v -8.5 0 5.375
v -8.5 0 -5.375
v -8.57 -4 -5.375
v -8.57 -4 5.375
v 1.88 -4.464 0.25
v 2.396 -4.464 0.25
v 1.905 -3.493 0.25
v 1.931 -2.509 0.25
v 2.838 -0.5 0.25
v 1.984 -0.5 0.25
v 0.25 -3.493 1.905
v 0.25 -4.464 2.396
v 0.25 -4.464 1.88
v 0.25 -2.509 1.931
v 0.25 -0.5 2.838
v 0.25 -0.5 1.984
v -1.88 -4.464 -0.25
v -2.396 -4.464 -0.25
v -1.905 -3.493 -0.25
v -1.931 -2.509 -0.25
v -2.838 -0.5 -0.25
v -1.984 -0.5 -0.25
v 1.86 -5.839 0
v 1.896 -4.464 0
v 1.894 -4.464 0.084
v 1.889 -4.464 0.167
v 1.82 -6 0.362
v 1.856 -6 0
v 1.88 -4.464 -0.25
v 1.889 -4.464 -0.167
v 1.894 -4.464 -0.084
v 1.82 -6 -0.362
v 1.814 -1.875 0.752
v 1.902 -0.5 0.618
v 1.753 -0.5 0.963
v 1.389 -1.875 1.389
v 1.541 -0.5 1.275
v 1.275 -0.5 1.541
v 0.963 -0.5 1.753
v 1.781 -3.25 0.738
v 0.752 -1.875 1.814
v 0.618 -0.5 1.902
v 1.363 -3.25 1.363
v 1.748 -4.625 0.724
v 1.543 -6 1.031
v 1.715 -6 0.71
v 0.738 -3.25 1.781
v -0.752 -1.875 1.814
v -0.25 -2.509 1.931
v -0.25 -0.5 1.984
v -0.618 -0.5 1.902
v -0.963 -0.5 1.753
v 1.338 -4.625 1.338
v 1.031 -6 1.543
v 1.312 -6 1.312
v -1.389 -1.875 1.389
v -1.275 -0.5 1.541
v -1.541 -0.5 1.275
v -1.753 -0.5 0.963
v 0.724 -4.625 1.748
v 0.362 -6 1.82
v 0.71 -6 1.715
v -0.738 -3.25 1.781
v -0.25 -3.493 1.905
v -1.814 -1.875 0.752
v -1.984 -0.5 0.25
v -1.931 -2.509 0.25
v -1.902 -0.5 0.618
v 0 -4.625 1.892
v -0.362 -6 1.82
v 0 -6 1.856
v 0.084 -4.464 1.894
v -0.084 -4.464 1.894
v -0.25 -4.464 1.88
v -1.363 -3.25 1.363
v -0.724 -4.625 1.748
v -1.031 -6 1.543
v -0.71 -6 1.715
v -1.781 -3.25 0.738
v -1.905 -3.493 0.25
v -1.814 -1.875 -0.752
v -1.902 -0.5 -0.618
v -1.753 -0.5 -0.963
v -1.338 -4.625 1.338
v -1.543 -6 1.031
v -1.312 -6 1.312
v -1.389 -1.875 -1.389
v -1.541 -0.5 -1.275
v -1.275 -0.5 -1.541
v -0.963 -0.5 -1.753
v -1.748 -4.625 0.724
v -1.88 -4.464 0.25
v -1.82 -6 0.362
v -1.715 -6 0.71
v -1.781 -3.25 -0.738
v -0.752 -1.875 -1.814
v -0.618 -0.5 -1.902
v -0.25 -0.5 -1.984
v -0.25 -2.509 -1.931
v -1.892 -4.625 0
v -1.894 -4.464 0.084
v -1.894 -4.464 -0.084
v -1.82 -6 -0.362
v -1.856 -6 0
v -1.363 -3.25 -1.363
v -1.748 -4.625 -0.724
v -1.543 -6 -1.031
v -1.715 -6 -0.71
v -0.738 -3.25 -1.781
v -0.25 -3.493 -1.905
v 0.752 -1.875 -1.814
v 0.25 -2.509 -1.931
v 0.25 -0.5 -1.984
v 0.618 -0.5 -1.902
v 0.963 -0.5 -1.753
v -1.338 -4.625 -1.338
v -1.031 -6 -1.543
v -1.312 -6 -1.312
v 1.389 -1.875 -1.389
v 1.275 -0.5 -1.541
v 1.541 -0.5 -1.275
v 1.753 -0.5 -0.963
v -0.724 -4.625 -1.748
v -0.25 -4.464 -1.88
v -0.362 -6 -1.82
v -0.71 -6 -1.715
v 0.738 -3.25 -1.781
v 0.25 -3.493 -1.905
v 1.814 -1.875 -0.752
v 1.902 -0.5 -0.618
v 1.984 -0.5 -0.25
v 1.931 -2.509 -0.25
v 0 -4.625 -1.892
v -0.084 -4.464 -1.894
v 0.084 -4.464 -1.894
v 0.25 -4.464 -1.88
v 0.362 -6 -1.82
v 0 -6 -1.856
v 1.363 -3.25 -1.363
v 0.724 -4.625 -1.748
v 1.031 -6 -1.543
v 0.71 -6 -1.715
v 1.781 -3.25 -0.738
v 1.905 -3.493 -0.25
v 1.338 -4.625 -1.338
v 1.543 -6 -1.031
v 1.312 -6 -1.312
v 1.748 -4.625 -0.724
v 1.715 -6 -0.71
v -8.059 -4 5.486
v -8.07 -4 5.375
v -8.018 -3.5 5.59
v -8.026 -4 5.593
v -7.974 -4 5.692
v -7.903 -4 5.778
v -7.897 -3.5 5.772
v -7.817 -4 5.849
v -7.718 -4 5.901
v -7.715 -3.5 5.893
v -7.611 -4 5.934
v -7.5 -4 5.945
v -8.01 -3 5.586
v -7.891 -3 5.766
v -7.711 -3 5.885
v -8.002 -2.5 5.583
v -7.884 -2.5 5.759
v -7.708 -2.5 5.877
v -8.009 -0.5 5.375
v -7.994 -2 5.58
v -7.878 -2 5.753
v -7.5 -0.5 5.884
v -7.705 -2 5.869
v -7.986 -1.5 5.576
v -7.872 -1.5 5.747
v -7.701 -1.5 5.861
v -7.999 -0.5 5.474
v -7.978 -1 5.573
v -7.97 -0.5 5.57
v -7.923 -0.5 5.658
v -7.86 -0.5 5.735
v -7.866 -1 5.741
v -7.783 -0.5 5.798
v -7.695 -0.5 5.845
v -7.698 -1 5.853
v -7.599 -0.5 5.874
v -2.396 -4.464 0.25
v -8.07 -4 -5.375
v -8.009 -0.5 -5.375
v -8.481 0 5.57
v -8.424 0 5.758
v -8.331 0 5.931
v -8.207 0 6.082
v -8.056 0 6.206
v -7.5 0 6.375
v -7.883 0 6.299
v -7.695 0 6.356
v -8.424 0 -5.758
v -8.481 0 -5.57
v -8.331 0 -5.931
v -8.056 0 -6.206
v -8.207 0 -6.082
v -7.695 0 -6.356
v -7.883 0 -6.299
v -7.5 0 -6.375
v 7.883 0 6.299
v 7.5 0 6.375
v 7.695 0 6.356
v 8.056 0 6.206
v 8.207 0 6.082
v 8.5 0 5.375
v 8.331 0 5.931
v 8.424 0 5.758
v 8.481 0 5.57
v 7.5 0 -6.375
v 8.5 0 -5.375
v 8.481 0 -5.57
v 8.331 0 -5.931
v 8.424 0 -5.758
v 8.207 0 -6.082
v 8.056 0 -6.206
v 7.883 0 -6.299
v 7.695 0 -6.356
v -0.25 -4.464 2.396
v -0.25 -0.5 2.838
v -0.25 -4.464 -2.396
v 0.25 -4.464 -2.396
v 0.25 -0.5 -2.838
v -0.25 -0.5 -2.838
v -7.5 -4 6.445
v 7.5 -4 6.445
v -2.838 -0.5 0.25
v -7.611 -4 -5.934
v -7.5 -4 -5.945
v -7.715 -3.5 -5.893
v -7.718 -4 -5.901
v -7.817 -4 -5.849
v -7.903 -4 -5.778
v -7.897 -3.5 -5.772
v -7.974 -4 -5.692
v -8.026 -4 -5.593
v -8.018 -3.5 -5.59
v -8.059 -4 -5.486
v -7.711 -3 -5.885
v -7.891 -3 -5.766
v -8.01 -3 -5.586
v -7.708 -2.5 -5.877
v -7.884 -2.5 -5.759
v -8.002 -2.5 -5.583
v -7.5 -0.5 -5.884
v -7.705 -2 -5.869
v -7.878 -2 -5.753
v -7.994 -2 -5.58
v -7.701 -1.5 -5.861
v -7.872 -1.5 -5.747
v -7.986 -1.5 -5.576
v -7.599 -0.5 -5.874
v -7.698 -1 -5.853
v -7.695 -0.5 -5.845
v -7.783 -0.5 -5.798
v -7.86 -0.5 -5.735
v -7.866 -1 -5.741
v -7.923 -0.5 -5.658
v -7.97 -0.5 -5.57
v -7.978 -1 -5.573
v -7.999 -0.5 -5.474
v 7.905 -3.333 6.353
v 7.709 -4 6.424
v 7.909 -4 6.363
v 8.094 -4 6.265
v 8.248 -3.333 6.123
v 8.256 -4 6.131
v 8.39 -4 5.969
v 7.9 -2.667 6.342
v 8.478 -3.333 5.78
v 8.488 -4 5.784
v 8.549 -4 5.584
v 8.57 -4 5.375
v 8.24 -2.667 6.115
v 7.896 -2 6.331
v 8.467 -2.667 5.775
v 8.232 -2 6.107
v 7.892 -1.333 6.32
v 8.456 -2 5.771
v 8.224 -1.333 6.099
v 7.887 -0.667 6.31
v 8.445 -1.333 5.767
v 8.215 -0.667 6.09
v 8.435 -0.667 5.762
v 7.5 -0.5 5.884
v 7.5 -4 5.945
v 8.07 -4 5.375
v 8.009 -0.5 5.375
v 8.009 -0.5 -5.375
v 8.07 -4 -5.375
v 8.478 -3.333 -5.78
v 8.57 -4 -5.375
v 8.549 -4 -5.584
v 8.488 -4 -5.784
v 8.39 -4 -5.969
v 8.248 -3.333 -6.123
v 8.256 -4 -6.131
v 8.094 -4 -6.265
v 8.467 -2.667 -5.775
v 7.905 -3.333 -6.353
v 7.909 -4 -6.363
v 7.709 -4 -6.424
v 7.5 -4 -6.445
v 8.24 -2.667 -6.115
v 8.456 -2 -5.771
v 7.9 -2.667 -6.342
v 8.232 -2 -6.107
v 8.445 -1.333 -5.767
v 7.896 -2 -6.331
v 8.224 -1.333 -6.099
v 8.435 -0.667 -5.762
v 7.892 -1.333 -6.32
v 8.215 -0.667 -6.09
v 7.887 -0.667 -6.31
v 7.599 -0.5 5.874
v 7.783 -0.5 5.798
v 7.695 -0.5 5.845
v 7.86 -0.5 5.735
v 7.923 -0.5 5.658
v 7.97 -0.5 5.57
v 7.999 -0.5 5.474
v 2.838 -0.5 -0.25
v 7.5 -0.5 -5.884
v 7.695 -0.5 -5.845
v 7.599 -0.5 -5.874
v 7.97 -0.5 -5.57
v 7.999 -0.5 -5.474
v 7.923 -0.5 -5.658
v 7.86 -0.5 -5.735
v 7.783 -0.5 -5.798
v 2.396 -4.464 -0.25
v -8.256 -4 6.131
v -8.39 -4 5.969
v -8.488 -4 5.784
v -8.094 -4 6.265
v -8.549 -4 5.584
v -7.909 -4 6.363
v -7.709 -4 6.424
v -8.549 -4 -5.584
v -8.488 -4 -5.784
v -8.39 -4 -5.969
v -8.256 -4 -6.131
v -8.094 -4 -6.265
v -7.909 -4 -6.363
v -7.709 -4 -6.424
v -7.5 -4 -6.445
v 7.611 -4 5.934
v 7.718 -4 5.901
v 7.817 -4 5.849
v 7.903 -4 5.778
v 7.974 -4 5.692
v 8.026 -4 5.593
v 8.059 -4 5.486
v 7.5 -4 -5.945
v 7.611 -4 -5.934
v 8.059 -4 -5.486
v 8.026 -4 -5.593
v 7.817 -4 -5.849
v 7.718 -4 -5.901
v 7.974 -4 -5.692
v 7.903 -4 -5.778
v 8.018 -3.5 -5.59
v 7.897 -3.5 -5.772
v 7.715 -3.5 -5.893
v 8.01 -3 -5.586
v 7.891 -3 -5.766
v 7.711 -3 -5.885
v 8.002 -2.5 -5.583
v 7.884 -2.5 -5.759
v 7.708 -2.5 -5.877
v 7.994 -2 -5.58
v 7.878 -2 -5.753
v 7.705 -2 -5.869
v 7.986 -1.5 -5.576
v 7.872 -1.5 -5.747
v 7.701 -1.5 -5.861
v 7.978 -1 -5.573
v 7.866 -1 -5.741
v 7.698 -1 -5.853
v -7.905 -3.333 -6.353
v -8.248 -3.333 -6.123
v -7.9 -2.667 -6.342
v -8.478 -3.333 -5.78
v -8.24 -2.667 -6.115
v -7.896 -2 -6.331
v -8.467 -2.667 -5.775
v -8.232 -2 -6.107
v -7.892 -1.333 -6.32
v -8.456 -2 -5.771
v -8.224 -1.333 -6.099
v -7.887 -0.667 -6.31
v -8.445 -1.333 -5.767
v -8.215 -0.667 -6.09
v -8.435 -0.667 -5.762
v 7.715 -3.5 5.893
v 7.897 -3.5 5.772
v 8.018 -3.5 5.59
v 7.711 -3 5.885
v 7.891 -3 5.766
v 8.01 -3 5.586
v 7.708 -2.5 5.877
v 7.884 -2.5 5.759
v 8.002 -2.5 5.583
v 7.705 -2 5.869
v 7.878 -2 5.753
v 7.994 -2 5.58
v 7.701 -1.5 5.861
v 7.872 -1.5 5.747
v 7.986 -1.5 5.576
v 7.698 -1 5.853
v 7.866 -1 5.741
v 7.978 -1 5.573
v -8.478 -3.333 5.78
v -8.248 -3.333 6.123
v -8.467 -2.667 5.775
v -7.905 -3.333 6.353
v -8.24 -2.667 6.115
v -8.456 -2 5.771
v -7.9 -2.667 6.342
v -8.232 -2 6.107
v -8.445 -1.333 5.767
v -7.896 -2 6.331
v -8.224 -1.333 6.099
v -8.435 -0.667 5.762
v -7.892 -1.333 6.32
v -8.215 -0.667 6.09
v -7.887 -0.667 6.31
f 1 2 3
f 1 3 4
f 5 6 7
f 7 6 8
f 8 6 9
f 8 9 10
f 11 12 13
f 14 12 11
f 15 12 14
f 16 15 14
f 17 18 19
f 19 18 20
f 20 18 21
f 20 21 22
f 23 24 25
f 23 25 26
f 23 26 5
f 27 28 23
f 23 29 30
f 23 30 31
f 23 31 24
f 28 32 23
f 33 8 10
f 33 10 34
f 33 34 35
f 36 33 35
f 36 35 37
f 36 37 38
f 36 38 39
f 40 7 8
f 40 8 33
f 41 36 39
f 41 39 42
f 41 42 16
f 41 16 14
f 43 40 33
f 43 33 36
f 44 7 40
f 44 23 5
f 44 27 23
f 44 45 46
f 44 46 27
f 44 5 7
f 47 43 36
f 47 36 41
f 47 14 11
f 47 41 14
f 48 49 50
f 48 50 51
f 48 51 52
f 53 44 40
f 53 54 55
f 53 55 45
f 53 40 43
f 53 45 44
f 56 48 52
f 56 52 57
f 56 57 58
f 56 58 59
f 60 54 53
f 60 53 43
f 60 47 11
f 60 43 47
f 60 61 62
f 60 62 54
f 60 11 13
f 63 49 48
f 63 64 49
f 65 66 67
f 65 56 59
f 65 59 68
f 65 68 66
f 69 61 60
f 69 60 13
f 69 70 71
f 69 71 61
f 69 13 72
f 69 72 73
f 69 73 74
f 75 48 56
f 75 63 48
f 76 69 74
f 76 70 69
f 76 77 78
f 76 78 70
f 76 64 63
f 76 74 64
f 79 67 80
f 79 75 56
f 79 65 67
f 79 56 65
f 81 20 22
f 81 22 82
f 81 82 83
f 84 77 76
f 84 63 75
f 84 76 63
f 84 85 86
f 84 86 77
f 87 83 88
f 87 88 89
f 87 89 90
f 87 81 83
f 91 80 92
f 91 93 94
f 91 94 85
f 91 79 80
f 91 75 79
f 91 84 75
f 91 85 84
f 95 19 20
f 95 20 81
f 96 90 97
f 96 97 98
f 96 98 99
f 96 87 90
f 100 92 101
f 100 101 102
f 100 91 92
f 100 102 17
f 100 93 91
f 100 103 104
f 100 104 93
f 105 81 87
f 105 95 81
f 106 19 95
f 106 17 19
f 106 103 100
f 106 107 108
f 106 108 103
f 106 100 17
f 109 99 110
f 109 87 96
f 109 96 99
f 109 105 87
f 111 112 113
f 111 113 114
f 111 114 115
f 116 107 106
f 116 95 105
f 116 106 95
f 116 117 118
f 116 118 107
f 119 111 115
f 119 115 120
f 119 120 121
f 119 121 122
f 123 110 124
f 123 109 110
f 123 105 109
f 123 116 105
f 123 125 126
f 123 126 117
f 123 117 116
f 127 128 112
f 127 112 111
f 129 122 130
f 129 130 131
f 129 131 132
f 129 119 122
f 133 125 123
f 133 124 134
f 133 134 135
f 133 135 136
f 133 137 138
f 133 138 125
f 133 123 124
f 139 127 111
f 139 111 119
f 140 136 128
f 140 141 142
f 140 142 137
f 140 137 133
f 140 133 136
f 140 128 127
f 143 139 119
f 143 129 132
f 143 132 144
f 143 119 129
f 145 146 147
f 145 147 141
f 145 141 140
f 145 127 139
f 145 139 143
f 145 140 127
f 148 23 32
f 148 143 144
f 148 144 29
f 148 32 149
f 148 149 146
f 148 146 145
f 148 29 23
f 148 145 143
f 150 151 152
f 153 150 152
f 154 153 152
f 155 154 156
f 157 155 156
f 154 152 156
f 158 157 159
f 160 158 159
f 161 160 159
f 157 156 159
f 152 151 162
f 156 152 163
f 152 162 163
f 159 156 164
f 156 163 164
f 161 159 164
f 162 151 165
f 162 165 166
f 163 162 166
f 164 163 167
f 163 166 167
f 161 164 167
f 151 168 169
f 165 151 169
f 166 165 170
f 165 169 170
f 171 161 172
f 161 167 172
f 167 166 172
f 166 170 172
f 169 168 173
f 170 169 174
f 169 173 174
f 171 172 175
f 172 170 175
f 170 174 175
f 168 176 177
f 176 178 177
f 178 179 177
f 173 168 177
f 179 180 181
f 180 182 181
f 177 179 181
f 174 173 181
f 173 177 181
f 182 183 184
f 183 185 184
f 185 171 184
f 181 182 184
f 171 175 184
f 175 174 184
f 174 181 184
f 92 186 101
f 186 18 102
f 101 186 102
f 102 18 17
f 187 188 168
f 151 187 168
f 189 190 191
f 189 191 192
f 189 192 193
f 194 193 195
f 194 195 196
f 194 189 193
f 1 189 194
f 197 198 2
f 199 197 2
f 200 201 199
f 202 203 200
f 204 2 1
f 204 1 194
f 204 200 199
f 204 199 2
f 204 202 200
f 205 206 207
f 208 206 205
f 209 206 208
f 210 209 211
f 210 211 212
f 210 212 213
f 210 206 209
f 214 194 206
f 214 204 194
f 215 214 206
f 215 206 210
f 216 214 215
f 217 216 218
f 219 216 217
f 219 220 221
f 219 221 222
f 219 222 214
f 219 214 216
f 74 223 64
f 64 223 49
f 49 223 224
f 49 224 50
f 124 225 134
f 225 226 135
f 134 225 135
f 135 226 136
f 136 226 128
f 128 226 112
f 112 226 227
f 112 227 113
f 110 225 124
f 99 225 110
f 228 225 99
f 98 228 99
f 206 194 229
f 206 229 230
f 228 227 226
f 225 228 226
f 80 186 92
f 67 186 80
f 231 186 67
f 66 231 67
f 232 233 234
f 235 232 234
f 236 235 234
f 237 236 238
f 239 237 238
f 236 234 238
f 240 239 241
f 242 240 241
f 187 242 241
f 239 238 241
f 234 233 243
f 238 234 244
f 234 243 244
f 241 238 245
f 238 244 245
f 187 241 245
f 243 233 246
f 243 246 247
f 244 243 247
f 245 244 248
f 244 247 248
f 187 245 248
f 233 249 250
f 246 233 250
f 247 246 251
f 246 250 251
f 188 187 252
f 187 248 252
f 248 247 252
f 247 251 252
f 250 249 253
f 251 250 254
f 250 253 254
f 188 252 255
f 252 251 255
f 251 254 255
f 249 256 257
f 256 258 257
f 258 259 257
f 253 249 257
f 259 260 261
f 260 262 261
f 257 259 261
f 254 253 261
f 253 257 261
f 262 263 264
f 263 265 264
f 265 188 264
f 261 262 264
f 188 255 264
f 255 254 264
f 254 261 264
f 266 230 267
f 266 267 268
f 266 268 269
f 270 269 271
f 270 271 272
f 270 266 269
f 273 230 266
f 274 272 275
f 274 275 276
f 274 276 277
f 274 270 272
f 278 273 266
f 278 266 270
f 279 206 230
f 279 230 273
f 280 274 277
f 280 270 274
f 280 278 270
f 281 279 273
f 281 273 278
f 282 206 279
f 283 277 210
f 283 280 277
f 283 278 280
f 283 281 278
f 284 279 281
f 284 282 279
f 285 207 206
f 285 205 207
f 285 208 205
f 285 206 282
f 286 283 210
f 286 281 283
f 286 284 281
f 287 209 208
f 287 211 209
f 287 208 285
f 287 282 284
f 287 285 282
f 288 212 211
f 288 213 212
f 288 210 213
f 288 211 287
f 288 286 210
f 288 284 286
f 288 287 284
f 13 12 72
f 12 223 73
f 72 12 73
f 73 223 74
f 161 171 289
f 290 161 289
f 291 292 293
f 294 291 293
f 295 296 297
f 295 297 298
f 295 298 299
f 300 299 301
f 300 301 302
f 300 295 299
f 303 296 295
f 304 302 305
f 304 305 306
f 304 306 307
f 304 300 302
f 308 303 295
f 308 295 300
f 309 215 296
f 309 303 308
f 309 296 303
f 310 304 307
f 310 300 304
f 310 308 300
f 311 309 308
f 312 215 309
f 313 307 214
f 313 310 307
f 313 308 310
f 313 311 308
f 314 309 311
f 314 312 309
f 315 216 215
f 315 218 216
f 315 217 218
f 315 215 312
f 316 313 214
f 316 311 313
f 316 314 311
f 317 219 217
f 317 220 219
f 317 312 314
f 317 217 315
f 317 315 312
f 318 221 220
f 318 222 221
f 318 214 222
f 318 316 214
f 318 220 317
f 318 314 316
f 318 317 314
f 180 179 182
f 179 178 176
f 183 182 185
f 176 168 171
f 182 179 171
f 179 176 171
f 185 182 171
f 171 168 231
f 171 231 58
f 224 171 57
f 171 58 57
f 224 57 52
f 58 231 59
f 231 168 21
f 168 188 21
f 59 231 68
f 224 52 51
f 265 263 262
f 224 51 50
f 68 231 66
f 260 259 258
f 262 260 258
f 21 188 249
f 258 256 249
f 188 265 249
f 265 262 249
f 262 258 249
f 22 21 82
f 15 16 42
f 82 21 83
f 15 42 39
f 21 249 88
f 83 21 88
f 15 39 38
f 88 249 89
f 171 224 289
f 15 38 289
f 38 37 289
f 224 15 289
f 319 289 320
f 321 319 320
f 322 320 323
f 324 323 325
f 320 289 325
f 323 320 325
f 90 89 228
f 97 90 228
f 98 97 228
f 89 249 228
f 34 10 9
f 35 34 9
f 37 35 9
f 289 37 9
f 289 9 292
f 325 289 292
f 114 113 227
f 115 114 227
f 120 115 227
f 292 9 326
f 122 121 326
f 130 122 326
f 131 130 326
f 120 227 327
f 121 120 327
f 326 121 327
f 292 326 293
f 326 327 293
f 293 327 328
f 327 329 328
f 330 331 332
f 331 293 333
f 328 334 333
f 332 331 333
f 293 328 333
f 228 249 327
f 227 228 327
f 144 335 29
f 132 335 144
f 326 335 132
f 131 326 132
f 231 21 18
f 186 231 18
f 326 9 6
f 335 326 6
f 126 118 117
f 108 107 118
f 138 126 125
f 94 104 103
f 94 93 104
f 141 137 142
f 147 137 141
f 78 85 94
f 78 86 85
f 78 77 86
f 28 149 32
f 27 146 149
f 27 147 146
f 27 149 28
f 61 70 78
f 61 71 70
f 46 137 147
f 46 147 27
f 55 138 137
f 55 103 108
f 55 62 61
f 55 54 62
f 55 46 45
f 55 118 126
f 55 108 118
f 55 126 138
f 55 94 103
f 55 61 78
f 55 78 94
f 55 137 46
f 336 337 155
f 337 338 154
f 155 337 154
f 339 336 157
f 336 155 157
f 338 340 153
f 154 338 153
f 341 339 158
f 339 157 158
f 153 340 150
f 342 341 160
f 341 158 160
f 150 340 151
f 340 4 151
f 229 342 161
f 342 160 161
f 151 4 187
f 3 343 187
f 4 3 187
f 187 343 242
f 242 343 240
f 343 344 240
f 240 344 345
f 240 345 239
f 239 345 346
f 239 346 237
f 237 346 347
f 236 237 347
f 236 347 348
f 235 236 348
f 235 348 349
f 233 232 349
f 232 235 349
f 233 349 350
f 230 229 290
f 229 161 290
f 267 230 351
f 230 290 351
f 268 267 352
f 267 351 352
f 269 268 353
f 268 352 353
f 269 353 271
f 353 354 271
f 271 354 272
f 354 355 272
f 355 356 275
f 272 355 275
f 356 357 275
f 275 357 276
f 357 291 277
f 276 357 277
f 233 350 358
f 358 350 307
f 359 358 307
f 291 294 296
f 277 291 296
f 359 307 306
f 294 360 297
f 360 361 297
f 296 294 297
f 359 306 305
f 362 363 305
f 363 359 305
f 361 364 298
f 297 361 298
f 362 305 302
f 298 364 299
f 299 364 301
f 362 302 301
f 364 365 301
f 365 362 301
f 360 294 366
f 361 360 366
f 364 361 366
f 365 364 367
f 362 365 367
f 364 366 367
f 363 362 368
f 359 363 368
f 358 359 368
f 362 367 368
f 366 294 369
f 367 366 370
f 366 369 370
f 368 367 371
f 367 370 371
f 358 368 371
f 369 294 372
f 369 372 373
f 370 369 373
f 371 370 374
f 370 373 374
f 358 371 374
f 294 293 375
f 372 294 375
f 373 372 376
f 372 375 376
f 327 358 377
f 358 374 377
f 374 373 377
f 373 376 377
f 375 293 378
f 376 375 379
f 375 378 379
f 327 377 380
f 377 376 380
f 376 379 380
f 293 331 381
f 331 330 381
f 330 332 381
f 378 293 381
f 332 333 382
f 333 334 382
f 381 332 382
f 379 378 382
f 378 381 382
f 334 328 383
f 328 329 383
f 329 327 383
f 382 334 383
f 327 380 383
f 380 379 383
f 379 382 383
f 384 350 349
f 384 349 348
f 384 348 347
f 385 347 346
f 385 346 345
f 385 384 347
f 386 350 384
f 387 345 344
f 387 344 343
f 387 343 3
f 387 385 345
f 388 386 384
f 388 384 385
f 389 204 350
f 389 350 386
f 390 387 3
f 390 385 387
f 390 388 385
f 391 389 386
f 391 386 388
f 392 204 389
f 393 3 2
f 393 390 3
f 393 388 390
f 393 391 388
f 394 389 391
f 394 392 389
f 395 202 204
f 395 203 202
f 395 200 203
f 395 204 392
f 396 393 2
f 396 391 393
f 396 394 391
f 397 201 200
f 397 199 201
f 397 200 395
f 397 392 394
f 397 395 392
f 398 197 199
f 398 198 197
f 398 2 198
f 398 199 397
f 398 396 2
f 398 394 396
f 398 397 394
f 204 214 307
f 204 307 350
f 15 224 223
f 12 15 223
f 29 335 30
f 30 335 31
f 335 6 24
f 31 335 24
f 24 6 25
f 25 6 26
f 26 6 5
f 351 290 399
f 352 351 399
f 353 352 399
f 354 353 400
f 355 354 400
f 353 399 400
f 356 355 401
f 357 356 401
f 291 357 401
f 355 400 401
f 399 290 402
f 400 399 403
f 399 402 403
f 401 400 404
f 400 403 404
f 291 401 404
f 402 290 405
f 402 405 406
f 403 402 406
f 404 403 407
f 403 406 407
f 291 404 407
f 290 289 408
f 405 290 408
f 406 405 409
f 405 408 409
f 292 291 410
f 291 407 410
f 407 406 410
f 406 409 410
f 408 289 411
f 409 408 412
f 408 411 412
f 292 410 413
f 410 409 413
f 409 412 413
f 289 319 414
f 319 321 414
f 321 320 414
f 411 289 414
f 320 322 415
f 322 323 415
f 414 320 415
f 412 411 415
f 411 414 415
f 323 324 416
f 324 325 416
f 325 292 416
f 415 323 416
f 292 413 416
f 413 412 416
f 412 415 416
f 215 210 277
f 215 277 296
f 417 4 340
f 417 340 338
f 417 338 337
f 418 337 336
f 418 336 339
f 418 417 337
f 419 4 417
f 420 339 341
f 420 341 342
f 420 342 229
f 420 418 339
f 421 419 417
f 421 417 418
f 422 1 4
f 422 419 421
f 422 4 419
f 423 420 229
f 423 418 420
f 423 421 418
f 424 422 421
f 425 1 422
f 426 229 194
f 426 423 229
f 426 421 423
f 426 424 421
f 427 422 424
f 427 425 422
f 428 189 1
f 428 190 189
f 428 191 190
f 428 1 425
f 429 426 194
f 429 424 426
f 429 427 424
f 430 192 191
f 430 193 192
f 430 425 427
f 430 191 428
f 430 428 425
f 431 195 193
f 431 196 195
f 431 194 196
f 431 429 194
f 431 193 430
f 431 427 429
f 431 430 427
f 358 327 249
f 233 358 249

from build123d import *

# Parameters (mm, degrees)
BOSS_EXTRUDE1_DEPTH = 4
BOSS_EXTRUDE1_DRAFT = 1
SHELL1_T            = -0.5
SKETCH2_R           = 2
BOSS_EXTRUDE2_DEPTH = 5.5
BOSS_EXTRUDE2_TAPER = 1.5
RIB1_START          = -0.25
RIB1_DEPTH          = 0.5
CIRPATTERN1_COUNT   = 4


# Read off the part's stored shape, not the designer's step: Rib1
with BuildPart() as part:
    # Sketch1 → Boss-Extrude1 (with draft: the straight prism first)
    with BuildSketch(Plane(origin=(0, 0, 0), x_dir=(1, 0, 0), z_dir=(0, 1, 0))):
        with BuildLine():
            Line((-7.5, -6.375), (7.5, -6.375))
            ThreePointArc((7.5, -6.375), (8.207106781, -6.082106781), (8.5, -5.375))
            Line((8.5, -5.375), (8.5, 5.375))
            ThreePointArc((8.5, 5.375), (8.207106781, 6.082106781), (7.5, 6.375))
            Line((7.5, 6.375), (-7.5, 6.375))
            ThreePointArc((-7.5, 6.375), (-8.207106781, 6.082106781), (-8.5, 5.375))
            Line((-8.5, 5.375), (-8.5, -5.375))
            ThreePointArc((-8.5, -5.375), (-8.207106781, -6.082106781), (-7.5, -6.375))
        make_face()
    extrude(amount=-BOSS_EXTRUDE1_DEPTH)
    # Boss-Extrude1: the draft: its side faces are tilted about the plane it starts from
    boss_extrude1_sides = [part.faces().sort_by_distance(p)[0] for p in [
        (0, -2, 6.375),
        (8.207106781, -2, 6.082106781),
        (8.5, -2, 0),
        (8.207106781, -2, -6.082106781),
        (0, -2, -6.375),
        (-8.207106781, -2, -6.082106781),
        (-8.5, -2, 0),
        (-8.207106781, -2, 6.082106781),
    ]]
    draft(boss_extrude1_sides, Plane(origin=(0, 0, 0), x_dir=(1, 0, 0), z_dir=(0, 1, 0)), BOSS_EXTRUDE1_DRAFT)

    # Shell1
    shell1_openings = [part.faces().sort_by_distance(p)[0] for p in [
        (0, -4, 0),
    ]]
    offset(amount=SHELL1_T, openings=shell1_openings, kind=Kind.INTERSECTION)

    # Sketch2 → Boss-Extrude2 (add)
    with BuildSketch(Plane.XZ.offset(0.5)):
        Circle(SKETCH2_R)
    extrude(amount=BOSS_EXTRUDE2_DEPTH, taper=BOSS_EXTRUDE2_TAPER)

    # Rib1 outline → Rib1 (add)
    with BuildSketch(Plane.XY.offset(RIB1_START)):
        Polygon((-2.396376072, -4.46378352), (-1, -4.46378352), (-1, 0), (-2.893975097, 0), (-2.838237736, -0.5), align=None)
    rib1 = extrude(amount=RIB1_DEPTH)

    # CirPattern1: Rib1 ×4 about axis
    cirpattern1_axis = Axis((0, 0, 0), (0, 1, 0))
    for i in range(1, CIRPATTERN1_COUNT):
        add(rib1.rotate(cirpattern1_axis, i * 360 / CIRPATTERN1_COUNT))


solid = part.part
